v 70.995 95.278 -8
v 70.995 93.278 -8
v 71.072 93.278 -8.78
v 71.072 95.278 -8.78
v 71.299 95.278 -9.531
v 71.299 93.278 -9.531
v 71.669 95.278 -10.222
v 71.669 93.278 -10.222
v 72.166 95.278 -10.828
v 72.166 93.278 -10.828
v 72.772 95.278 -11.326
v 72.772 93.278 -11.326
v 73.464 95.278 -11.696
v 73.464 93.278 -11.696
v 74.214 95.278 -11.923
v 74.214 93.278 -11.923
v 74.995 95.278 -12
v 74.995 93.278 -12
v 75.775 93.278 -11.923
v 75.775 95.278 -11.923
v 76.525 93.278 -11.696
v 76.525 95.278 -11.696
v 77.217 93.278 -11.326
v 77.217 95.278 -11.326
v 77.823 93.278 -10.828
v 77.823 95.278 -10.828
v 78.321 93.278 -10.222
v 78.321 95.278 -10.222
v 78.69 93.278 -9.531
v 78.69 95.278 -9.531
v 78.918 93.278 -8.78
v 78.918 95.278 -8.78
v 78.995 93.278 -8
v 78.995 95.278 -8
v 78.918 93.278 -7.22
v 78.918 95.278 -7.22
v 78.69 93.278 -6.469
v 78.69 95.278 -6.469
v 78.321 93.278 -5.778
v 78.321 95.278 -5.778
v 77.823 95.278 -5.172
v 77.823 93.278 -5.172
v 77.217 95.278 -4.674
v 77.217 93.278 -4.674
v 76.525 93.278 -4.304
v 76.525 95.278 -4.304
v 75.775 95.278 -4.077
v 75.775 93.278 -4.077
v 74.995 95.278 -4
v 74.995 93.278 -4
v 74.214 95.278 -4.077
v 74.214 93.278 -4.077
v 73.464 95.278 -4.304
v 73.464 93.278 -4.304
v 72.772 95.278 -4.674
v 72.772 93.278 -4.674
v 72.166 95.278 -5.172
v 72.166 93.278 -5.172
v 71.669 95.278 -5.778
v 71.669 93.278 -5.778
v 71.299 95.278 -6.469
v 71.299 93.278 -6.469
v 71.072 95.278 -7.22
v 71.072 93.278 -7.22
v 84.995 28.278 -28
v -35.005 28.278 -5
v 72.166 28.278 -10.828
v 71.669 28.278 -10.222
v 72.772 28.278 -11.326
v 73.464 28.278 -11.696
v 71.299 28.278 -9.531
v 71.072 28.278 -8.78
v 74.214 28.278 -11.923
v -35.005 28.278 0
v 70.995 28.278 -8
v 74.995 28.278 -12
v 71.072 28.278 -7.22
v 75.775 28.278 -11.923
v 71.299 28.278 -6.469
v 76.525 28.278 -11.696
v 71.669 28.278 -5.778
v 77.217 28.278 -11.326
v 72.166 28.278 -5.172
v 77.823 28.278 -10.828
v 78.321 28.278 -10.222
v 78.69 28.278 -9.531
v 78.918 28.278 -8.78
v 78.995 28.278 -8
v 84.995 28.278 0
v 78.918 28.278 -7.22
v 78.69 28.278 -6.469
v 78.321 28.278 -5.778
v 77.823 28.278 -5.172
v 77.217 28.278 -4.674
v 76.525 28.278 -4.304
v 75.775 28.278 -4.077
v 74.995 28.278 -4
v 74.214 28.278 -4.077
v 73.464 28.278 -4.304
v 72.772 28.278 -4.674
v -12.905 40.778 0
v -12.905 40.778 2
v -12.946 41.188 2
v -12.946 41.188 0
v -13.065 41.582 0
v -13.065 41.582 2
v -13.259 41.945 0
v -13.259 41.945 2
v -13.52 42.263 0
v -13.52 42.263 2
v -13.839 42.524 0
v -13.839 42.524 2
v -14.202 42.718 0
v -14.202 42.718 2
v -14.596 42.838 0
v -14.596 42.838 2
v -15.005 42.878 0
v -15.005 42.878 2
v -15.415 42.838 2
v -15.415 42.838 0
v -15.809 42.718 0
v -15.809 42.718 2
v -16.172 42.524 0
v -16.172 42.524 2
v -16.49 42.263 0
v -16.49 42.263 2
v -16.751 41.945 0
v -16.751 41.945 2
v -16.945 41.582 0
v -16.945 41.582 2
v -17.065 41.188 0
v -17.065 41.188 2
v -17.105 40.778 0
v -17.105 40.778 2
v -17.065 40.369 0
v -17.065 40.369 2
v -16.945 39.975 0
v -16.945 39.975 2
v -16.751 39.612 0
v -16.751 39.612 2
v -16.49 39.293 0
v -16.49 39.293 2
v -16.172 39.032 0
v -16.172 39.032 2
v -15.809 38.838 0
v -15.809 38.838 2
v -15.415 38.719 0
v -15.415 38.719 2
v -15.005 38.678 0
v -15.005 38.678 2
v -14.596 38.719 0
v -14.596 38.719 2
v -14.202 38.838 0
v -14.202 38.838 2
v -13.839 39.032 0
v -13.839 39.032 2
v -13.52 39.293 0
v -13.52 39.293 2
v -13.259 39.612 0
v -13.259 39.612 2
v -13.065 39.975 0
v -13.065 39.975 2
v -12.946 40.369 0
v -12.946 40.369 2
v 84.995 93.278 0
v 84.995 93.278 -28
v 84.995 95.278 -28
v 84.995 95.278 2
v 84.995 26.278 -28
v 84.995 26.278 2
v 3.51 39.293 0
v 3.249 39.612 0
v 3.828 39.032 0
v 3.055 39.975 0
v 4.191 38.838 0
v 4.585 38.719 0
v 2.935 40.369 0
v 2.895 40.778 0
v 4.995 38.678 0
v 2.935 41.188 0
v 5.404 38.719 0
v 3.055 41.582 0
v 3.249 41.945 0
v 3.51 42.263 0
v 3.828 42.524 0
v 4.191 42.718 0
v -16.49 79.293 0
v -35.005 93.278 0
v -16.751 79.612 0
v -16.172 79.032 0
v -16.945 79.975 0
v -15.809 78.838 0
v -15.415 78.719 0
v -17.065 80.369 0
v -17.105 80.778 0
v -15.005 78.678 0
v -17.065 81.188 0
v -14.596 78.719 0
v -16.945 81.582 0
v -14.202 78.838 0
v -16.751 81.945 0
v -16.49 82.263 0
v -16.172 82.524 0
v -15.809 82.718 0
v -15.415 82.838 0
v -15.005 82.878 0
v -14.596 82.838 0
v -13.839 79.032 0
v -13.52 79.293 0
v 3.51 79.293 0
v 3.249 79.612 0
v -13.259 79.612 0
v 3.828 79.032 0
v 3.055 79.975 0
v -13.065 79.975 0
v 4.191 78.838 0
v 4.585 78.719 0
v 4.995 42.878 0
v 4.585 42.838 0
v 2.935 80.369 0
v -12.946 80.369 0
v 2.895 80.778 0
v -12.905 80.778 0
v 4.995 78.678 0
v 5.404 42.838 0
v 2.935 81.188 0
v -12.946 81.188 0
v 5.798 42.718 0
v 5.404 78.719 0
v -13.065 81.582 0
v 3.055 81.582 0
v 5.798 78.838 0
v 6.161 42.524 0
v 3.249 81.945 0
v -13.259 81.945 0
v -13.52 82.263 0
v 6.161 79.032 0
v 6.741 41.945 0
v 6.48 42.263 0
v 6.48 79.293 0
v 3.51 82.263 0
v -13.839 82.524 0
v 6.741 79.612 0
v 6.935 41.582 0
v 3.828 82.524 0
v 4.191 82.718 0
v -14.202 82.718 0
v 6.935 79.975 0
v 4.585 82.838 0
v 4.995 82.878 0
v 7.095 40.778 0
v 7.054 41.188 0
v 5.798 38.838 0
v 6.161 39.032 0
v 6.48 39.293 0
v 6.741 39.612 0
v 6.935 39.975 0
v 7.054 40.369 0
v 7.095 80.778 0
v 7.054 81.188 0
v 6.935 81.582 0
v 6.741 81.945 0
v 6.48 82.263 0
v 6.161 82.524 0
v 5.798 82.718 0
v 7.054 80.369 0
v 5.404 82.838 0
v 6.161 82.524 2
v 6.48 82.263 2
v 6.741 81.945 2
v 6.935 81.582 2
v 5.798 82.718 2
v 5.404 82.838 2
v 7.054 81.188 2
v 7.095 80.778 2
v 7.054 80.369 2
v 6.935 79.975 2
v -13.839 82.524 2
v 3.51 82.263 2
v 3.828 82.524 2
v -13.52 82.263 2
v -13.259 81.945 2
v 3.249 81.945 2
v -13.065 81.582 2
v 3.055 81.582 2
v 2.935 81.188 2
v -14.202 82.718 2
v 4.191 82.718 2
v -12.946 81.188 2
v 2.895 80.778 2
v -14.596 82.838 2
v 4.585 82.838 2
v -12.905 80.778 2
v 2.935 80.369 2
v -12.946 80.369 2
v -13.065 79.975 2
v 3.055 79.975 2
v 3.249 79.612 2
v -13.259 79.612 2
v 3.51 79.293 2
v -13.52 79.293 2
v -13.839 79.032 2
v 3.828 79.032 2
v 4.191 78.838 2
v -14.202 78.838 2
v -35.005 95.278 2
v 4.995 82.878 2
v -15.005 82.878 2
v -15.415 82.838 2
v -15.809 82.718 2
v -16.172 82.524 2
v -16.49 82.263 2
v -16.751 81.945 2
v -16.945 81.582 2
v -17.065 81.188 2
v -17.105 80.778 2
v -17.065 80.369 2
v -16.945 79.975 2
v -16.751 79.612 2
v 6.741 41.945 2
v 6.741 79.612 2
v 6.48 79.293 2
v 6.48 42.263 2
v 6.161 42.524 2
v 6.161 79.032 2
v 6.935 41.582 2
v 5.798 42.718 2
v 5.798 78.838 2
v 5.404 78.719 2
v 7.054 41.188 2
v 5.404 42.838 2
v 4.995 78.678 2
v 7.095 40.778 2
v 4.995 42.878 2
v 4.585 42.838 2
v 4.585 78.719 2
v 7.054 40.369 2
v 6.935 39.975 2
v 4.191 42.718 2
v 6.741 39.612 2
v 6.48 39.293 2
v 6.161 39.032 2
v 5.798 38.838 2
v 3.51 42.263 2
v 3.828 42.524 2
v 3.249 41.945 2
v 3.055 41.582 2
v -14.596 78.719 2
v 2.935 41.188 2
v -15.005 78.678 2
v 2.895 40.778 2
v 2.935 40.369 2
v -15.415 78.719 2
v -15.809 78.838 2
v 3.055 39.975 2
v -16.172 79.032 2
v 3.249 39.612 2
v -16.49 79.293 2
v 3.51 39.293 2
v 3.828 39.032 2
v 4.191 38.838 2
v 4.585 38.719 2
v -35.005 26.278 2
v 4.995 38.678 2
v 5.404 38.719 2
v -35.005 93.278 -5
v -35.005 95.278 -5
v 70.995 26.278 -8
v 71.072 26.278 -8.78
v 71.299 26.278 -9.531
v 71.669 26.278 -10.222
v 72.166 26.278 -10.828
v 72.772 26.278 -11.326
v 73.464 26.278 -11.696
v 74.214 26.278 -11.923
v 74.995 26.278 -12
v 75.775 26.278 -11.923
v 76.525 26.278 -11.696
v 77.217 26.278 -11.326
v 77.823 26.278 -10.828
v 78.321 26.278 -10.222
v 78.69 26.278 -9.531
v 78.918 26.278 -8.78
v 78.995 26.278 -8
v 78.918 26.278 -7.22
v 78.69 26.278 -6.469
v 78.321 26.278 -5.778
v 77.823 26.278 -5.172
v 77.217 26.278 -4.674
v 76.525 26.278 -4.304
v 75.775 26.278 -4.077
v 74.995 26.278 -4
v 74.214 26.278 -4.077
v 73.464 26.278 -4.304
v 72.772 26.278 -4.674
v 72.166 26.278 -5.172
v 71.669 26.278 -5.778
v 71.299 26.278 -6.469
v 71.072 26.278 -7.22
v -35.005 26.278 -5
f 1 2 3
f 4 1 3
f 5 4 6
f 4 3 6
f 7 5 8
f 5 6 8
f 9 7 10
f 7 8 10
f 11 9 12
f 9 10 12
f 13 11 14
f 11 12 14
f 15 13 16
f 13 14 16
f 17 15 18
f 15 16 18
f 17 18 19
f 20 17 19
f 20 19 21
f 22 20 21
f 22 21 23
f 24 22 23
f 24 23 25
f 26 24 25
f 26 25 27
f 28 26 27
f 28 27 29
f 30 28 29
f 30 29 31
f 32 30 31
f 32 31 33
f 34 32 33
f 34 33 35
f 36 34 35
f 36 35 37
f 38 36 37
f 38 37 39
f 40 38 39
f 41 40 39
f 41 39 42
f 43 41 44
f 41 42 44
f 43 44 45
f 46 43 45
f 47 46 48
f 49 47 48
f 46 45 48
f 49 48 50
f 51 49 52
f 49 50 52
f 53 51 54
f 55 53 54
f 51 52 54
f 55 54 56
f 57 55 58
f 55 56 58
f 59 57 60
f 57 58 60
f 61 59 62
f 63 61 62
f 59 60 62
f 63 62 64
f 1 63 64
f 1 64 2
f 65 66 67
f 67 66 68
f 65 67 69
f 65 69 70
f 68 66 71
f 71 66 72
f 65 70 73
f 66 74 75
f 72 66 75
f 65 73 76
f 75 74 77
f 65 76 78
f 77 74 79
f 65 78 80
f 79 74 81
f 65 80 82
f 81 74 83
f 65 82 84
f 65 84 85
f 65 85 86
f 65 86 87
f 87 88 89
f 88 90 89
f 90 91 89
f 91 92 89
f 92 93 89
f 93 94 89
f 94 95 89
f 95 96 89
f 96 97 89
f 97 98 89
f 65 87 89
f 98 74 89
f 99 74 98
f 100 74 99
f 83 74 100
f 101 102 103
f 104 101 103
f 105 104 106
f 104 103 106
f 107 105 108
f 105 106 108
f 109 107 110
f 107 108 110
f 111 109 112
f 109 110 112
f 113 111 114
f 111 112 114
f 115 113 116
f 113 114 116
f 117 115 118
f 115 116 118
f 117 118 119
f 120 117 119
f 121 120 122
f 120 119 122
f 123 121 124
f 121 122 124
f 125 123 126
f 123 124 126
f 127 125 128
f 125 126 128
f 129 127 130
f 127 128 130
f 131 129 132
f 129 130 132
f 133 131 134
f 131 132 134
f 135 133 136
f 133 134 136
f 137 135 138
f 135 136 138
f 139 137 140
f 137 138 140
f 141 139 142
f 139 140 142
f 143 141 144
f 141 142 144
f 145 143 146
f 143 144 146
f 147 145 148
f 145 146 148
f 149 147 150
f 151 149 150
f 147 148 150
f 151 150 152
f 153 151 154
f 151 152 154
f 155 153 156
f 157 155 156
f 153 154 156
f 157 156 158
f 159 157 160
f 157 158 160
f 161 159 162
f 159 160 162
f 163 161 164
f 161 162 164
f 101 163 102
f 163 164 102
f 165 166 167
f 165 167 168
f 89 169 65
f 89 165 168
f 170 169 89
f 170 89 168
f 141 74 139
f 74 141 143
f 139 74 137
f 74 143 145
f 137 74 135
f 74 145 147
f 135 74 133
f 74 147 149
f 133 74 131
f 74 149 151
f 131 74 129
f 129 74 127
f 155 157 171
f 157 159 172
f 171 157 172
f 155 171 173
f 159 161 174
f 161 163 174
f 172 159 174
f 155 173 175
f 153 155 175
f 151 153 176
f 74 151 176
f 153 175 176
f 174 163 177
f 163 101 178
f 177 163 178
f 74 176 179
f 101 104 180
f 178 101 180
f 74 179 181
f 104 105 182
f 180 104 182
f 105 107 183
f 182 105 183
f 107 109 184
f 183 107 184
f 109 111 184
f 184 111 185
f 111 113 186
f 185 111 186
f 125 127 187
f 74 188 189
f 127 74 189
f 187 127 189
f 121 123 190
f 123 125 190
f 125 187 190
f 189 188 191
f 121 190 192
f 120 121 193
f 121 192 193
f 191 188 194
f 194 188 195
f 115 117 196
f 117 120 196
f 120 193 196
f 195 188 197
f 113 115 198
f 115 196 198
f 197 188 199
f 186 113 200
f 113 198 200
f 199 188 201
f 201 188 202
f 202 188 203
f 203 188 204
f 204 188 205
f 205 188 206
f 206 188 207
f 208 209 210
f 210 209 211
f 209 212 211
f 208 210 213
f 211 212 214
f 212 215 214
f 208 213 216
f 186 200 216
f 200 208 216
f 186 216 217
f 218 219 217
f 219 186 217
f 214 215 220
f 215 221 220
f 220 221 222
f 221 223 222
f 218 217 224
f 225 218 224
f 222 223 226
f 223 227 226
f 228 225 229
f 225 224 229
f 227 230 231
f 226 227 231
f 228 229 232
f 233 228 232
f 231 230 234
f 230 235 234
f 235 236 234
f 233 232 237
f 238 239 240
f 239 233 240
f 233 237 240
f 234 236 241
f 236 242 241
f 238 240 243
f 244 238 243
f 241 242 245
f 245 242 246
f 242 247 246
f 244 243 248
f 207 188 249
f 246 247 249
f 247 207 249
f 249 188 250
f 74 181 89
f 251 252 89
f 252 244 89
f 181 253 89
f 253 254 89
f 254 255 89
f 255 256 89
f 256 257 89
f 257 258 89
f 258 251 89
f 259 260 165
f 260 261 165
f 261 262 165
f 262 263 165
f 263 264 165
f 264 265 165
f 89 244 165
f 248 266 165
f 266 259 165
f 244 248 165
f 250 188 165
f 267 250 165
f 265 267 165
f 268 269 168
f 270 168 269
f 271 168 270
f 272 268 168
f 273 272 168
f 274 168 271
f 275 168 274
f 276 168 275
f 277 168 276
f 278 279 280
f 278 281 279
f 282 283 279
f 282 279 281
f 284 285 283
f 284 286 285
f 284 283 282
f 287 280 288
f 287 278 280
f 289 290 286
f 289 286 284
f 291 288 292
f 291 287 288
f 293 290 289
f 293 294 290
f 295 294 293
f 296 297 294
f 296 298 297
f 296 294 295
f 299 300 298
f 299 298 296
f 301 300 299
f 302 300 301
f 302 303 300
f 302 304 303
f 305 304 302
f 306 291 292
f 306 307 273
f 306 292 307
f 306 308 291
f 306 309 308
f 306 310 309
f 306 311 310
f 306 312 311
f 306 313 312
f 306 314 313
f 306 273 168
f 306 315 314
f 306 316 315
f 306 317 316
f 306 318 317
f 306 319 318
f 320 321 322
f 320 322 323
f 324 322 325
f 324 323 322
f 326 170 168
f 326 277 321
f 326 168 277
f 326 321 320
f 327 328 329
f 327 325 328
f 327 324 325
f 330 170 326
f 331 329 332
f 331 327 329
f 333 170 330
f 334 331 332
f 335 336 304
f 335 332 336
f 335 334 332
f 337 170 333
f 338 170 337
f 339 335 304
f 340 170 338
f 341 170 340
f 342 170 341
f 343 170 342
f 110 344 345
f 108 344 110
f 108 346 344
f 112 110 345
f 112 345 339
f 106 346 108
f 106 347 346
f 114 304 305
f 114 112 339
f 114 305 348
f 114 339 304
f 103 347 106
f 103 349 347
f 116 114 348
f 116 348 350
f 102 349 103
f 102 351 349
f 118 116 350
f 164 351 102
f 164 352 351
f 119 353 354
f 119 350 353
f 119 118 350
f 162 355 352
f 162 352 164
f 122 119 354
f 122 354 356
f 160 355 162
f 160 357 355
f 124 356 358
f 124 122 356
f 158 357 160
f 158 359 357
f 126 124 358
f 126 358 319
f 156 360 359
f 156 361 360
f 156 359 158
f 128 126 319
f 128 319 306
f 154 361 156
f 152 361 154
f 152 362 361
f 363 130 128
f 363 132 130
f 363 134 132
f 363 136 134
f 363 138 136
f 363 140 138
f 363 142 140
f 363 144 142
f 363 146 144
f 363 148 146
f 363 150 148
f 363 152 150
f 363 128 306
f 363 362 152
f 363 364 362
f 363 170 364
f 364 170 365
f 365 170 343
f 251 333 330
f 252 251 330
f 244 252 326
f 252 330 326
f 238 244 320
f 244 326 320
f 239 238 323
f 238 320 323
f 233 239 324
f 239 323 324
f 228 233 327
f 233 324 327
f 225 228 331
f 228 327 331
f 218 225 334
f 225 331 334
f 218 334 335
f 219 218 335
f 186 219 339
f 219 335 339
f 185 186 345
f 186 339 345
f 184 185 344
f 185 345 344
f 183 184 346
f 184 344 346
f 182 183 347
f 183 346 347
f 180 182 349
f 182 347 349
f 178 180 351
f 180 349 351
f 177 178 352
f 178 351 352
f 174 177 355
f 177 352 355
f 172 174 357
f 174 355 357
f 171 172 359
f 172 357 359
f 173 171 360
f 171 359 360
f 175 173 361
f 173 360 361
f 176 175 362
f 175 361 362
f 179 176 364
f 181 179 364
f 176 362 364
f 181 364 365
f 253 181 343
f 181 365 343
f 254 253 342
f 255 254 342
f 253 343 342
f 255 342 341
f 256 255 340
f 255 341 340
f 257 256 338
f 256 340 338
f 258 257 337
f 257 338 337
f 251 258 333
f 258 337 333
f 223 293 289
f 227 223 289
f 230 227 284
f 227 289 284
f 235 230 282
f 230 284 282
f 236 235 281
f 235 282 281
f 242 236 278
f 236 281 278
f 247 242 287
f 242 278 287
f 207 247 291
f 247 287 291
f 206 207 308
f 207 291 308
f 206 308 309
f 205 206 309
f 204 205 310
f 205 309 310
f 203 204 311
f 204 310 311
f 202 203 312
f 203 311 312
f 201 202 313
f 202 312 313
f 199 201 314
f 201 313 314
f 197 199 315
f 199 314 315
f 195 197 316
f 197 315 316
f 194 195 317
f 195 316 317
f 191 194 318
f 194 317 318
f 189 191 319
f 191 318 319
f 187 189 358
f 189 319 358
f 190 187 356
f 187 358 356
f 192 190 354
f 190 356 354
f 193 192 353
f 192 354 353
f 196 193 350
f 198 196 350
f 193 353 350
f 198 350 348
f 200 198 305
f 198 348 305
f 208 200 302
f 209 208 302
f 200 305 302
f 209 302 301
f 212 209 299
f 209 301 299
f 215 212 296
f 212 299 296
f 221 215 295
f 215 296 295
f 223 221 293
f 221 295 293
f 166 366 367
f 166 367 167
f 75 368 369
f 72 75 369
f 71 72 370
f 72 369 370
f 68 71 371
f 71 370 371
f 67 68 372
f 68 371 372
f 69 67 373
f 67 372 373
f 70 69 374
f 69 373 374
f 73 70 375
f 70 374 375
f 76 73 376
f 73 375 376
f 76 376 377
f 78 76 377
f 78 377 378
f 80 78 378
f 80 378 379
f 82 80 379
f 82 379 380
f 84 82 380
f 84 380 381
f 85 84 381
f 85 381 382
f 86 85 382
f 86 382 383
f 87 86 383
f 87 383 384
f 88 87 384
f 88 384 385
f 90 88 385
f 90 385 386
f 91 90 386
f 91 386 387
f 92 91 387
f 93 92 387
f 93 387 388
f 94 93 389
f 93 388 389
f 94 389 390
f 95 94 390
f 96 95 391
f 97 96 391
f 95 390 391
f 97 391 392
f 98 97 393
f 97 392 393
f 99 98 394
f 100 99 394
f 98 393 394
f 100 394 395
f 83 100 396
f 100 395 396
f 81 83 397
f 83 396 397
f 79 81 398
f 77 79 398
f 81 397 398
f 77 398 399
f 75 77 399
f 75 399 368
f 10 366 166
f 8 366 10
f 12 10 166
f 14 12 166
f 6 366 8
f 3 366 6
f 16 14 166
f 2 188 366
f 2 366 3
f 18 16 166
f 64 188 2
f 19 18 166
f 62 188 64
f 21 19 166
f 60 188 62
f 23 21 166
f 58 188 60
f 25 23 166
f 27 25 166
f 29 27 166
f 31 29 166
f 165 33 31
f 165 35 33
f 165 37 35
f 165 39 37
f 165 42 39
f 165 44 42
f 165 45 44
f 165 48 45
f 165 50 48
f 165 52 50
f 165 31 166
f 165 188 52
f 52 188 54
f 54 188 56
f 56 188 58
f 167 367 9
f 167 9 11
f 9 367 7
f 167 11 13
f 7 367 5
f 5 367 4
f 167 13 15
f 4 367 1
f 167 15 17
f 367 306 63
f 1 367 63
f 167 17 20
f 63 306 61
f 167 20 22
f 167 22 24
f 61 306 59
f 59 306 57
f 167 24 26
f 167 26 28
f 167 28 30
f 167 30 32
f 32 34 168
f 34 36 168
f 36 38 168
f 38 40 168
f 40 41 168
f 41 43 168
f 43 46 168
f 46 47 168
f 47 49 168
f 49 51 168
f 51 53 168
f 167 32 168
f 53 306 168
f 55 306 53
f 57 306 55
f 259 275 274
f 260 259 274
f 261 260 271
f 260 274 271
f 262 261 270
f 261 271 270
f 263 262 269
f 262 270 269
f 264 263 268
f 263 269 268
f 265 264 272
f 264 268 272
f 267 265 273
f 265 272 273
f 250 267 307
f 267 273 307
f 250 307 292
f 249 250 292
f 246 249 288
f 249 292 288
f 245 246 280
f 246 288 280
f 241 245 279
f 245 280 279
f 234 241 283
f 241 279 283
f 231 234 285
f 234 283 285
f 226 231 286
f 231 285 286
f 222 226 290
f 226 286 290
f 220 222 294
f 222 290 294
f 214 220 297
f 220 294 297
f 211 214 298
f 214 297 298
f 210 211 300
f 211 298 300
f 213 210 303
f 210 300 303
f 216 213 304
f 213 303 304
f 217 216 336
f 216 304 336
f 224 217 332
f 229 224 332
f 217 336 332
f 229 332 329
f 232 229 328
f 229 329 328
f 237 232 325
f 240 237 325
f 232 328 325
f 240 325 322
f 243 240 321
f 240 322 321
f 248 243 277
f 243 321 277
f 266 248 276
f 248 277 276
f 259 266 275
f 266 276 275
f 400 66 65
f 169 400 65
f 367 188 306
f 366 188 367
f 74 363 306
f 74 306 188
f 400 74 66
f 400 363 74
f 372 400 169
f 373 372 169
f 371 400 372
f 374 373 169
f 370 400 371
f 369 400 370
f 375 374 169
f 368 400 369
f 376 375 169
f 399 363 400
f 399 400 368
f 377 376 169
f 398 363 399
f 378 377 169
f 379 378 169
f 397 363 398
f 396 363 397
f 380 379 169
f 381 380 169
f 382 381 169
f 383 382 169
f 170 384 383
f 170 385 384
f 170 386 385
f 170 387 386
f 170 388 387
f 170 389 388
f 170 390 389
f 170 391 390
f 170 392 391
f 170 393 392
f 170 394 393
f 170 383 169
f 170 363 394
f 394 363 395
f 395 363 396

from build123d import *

# Parameters (mm, degrees)
SKETCH_1_W          = 120
SKETCH_1_H          = 65
EXTRUDE_1_DEPTH     = 2
EXTRUDE_2_DEPTH     = 2
SKETCH_3_R          = 2.1
CUT_EXTRUDE_1_DEPTH = 2
SKETCH_4_R          = 4
CUT_EXTRUDE_2_DEPTH = 70


with BuildPart() as part:
    # 草图1 → 凸台-拉伸1 (new body)
    with BuildSketch(Plane.XY):
        with Locations((24.994747839, 60.778264202)):
            Rectangle(SKETCH_1_W, SKETCH_1_H)
    extrude(amount=EXTRUDE_1_DEPTH)

    # 草图2 → 凸台-拉伸2 (add)
    with BuildSketch(Plane.XZ.offset(-28.278264202)):
        Polygon((-35.005252161, 2), (-35.005252161, 0), (-35.005252161, -5), (84.994747839, -28), (84.994747839, 2), align=None)
    extrude_2 = extrude(amount=EXTRUDE_2_DEPTH)

    # 镜向1: 凸台-拉伸2 across plane
    add(extrude_2.mirror(Plane.ZX.offset(60.778264202)))

    # 草图3 → 切除-拉伸1 (cut)
    with BuildSketch(Plane.XY.offset(2)):
        with Locations((-15.005252161, 80.778264202)):
            Circle(SKETCH_3_R)
        with Locations((4.994747839, 80.778264202)):
            Circle(SKETCH_3_R)
        with Locations((-15.005252161, 40.778264202)):
            Circle(SKETCH_3_R)
        with Locations((4.994747839, 40.778264202)):
            Circle(SKETCH_3_R)
    extrude(amount=-CUT_EXTRUDE_1_DEPTH, mode=Mode.SUBTRACT)

    # 草图4 → 切除-拉伸2 (cut)
    with BuildSketch(Plane(origin=(0, 26.278264202, 0), x_dir=(-1, 0, 0), z_dir=(0, -1, 0))):
        with Locations((-74.994747839, 8)):
            Circle(SKETCH_4_R)
    extrude(amount=-CUT_EXTRUDE_2_DEPTH, mode=Mode.SUBTRACT)


solid = part.part
